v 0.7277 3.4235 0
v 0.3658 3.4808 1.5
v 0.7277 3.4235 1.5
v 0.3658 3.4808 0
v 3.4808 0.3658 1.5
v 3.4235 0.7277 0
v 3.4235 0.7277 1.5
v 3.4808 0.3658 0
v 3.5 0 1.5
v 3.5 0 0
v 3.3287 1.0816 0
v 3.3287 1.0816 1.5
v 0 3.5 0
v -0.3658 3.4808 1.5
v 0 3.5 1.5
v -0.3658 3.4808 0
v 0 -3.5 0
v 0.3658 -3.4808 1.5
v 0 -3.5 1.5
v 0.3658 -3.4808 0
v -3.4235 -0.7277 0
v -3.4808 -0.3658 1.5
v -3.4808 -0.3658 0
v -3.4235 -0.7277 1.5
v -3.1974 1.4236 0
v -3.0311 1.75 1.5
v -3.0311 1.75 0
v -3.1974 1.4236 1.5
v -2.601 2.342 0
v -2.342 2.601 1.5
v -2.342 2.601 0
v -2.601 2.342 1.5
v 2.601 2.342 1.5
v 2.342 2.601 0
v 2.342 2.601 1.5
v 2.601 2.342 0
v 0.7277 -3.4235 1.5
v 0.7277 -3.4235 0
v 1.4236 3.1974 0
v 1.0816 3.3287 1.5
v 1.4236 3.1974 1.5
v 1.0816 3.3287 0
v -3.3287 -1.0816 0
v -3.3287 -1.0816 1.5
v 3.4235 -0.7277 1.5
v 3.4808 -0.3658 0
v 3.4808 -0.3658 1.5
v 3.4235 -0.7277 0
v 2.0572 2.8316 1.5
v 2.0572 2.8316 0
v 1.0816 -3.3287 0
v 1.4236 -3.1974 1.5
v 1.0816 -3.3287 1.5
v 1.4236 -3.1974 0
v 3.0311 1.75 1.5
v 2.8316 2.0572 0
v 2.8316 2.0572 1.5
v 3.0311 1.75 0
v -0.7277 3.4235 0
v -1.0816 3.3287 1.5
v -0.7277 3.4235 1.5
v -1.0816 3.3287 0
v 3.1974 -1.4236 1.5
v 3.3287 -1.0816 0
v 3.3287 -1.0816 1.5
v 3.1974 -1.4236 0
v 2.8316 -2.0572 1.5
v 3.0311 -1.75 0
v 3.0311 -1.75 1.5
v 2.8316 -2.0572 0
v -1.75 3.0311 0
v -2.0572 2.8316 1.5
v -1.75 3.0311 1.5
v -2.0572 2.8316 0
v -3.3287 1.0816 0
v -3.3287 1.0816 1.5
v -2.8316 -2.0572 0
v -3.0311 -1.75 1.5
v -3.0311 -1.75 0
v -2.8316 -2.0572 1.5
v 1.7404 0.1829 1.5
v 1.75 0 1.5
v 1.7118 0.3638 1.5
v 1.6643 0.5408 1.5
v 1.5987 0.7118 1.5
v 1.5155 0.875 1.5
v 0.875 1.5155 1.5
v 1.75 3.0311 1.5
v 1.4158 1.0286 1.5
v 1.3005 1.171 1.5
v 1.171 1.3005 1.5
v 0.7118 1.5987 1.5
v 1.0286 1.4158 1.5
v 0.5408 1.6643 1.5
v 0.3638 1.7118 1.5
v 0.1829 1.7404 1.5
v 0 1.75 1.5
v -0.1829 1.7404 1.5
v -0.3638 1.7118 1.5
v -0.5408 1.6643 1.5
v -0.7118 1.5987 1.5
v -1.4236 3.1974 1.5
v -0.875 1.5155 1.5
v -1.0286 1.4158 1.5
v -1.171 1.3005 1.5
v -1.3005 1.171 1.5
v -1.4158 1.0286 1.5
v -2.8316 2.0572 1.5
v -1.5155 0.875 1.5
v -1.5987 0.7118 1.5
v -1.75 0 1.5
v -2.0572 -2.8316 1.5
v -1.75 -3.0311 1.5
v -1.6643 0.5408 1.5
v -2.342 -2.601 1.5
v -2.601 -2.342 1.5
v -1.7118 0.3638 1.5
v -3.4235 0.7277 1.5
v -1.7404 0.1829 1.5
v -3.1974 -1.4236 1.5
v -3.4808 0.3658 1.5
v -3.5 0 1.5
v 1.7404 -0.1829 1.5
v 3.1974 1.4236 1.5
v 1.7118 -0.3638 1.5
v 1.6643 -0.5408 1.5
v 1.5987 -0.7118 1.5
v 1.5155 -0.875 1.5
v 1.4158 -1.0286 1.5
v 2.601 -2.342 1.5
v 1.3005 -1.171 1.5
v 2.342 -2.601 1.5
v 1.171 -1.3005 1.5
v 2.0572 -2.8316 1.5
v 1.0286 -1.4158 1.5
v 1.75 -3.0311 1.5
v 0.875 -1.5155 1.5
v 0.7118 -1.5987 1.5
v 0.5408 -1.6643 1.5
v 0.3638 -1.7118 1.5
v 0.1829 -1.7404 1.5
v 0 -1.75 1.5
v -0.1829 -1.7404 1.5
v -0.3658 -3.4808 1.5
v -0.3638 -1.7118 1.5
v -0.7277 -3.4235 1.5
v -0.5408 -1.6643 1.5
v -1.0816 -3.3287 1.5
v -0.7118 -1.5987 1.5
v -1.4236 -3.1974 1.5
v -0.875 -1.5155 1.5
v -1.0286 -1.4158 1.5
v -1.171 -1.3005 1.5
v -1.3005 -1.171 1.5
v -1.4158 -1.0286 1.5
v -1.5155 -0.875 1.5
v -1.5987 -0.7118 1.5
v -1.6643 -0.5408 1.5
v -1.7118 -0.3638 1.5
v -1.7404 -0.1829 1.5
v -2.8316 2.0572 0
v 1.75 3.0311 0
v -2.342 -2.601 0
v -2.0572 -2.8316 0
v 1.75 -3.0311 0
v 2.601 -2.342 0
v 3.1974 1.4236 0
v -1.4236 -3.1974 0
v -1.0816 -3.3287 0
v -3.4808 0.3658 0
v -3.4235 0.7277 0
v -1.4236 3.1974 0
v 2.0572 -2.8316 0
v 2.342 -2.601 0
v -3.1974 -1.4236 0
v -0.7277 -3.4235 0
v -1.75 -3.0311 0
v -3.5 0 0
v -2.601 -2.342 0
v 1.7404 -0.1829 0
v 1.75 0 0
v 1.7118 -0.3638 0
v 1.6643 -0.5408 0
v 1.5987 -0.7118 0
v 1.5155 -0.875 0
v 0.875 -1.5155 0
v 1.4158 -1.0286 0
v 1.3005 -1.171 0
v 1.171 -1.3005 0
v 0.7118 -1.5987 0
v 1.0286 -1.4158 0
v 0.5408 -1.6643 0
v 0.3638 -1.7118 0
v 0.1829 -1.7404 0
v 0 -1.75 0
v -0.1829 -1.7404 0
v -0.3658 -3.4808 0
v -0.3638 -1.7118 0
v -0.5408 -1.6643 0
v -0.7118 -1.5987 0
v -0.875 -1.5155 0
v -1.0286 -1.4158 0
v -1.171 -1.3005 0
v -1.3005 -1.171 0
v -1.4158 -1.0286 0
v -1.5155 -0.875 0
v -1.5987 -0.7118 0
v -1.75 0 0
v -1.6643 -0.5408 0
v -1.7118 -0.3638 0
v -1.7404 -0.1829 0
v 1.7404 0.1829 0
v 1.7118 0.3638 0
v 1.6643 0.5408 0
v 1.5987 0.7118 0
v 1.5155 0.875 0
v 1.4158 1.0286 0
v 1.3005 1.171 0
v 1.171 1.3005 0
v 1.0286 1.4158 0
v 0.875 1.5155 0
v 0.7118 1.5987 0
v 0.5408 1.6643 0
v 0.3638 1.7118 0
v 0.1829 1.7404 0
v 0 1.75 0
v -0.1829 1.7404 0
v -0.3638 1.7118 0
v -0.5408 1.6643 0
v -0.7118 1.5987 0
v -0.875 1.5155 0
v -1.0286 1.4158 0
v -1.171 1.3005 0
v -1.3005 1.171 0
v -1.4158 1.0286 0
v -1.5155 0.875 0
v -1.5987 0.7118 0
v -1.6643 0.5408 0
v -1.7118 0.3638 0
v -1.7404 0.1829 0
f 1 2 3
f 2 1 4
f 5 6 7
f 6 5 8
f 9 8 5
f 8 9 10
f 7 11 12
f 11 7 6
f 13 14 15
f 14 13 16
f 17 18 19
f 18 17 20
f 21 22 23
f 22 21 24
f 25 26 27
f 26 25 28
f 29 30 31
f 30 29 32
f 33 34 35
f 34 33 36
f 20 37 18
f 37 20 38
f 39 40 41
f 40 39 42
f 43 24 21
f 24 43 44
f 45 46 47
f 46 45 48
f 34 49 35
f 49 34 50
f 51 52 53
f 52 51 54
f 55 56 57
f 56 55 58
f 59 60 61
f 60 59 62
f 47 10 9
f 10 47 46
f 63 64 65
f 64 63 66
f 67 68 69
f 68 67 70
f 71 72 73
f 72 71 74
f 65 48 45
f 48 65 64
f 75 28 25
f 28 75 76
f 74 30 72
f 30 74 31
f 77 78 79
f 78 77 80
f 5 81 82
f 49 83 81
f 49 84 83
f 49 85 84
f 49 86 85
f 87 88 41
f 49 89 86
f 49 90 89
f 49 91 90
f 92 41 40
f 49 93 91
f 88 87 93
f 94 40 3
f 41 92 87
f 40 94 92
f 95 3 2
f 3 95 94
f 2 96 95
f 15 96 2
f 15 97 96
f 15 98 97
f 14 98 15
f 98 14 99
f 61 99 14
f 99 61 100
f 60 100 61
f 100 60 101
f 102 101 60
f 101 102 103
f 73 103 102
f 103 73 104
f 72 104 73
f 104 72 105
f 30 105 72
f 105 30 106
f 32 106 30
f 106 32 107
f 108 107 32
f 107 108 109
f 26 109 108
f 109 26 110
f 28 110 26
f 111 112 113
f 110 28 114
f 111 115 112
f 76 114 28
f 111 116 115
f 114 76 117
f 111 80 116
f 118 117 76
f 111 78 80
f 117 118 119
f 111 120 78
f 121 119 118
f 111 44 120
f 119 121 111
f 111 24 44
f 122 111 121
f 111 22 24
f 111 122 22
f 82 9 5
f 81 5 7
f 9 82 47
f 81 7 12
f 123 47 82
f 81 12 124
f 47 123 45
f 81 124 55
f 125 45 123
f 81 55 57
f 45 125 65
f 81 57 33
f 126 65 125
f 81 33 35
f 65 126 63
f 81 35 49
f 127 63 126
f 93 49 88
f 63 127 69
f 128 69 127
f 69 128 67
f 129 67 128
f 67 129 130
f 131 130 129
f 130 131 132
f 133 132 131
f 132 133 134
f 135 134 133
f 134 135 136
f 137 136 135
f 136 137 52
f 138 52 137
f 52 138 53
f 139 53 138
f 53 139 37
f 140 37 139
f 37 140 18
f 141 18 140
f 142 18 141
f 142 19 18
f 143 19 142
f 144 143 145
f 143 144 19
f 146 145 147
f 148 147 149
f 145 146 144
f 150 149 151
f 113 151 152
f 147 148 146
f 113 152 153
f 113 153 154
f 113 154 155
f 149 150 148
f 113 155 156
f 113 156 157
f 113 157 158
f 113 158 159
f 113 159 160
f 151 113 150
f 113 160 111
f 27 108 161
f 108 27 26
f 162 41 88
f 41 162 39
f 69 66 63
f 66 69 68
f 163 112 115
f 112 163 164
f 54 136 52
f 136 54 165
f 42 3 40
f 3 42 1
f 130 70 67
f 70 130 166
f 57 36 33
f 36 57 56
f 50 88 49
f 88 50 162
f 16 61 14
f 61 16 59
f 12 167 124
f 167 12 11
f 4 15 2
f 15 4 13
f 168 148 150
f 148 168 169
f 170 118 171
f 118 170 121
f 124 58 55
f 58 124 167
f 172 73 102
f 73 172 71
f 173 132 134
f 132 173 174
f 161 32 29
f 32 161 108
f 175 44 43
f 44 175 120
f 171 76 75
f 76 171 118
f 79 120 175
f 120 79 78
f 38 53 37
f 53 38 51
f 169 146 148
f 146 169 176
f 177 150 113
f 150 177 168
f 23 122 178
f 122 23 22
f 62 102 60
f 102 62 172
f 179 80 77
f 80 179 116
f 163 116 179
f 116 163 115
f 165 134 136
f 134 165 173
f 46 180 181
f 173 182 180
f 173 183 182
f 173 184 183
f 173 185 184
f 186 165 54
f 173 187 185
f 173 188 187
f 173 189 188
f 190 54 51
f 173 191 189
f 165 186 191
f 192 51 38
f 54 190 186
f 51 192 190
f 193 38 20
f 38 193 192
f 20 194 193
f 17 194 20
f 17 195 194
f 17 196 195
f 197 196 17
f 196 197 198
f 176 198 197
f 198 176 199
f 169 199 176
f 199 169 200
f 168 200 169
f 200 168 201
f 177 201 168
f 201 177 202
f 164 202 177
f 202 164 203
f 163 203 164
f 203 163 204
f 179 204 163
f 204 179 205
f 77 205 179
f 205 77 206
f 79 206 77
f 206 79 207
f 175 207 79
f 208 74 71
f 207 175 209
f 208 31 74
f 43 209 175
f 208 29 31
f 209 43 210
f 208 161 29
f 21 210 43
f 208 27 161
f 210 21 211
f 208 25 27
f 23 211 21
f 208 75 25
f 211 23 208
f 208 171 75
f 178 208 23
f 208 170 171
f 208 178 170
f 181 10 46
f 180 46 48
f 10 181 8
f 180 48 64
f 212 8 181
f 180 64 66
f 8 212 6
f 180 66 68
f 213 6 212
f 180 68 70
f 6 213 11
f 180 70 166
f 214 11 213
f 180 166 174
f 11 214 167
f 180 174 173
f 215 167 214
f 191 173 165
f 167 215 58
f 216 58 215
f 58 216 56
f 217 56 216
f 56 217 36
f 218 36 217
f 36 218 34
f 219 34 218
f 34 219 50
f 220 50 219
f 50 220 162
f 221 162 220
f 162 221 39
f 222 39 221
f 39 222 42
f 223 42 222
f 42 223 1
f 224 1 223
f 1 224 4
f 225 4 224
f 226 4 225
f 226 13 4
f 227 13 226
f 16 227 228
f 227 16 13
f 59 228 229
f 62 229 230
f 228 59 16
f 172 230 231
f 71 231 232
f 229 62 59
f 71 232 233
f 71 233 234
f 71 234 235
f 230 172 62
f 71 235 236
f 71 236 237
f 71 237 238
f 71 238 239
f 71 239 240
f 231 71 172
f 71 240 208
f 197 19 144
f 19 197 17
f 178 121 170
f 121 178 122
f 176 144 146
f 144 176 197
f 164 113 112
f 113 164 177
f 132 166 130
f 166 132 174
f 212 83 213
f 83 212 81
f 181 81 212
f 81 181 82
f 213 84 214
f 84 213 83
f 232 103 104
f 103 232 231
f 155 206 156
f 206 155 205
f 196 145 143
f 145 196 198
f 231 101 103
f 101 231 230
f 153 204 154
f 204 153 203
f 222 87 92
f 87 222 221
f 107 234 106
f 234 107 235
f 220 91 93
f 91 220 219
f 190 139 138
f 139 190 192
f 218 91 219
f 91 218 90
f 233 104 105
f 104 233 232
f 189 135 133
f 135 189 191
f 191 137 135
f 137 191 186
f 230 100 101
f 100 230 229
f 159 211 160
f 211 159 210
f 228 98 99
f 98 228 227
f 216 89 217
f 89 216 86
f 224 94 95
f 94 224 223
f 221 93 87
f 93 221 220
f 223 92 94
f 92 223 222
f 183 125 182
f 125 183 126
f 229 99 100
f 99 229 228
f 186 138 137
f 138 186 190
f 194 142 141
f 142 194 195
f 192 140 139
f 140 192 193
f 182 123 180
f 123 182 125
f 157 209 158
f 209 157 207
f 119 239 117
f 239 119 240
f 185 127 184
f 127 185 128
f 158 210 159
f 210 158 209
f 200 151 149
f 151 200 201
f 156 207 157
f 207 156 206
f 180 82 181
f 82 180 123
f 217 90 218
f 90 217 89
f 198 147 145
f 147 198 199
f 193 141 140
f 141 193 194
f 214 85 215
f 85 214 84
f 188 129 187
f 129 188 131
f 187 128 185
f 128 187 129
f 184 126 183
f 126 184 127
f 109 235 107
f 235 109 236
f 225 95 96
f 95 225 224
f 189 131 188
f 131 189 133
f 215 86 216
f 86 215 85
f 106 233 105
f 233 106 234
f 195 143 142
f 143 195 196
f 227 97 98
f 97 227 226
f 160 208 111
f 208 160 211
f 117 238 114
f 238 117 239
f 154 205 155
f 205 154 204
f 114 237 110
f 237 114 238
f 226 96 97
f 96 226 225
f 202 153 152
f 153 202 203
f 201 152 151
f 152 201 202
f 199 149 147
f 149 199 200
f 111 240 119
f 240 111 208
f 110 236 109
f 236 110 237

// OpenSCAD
// Washer 

// To Do: create parameters for the dimensions
// To Do: use the parameters


$fn=60;

difference() {

cylinder(h=1.5, d=7);
    translate([0,0,-.5] ) { cylinder(h=4, d=3.5); }
}
